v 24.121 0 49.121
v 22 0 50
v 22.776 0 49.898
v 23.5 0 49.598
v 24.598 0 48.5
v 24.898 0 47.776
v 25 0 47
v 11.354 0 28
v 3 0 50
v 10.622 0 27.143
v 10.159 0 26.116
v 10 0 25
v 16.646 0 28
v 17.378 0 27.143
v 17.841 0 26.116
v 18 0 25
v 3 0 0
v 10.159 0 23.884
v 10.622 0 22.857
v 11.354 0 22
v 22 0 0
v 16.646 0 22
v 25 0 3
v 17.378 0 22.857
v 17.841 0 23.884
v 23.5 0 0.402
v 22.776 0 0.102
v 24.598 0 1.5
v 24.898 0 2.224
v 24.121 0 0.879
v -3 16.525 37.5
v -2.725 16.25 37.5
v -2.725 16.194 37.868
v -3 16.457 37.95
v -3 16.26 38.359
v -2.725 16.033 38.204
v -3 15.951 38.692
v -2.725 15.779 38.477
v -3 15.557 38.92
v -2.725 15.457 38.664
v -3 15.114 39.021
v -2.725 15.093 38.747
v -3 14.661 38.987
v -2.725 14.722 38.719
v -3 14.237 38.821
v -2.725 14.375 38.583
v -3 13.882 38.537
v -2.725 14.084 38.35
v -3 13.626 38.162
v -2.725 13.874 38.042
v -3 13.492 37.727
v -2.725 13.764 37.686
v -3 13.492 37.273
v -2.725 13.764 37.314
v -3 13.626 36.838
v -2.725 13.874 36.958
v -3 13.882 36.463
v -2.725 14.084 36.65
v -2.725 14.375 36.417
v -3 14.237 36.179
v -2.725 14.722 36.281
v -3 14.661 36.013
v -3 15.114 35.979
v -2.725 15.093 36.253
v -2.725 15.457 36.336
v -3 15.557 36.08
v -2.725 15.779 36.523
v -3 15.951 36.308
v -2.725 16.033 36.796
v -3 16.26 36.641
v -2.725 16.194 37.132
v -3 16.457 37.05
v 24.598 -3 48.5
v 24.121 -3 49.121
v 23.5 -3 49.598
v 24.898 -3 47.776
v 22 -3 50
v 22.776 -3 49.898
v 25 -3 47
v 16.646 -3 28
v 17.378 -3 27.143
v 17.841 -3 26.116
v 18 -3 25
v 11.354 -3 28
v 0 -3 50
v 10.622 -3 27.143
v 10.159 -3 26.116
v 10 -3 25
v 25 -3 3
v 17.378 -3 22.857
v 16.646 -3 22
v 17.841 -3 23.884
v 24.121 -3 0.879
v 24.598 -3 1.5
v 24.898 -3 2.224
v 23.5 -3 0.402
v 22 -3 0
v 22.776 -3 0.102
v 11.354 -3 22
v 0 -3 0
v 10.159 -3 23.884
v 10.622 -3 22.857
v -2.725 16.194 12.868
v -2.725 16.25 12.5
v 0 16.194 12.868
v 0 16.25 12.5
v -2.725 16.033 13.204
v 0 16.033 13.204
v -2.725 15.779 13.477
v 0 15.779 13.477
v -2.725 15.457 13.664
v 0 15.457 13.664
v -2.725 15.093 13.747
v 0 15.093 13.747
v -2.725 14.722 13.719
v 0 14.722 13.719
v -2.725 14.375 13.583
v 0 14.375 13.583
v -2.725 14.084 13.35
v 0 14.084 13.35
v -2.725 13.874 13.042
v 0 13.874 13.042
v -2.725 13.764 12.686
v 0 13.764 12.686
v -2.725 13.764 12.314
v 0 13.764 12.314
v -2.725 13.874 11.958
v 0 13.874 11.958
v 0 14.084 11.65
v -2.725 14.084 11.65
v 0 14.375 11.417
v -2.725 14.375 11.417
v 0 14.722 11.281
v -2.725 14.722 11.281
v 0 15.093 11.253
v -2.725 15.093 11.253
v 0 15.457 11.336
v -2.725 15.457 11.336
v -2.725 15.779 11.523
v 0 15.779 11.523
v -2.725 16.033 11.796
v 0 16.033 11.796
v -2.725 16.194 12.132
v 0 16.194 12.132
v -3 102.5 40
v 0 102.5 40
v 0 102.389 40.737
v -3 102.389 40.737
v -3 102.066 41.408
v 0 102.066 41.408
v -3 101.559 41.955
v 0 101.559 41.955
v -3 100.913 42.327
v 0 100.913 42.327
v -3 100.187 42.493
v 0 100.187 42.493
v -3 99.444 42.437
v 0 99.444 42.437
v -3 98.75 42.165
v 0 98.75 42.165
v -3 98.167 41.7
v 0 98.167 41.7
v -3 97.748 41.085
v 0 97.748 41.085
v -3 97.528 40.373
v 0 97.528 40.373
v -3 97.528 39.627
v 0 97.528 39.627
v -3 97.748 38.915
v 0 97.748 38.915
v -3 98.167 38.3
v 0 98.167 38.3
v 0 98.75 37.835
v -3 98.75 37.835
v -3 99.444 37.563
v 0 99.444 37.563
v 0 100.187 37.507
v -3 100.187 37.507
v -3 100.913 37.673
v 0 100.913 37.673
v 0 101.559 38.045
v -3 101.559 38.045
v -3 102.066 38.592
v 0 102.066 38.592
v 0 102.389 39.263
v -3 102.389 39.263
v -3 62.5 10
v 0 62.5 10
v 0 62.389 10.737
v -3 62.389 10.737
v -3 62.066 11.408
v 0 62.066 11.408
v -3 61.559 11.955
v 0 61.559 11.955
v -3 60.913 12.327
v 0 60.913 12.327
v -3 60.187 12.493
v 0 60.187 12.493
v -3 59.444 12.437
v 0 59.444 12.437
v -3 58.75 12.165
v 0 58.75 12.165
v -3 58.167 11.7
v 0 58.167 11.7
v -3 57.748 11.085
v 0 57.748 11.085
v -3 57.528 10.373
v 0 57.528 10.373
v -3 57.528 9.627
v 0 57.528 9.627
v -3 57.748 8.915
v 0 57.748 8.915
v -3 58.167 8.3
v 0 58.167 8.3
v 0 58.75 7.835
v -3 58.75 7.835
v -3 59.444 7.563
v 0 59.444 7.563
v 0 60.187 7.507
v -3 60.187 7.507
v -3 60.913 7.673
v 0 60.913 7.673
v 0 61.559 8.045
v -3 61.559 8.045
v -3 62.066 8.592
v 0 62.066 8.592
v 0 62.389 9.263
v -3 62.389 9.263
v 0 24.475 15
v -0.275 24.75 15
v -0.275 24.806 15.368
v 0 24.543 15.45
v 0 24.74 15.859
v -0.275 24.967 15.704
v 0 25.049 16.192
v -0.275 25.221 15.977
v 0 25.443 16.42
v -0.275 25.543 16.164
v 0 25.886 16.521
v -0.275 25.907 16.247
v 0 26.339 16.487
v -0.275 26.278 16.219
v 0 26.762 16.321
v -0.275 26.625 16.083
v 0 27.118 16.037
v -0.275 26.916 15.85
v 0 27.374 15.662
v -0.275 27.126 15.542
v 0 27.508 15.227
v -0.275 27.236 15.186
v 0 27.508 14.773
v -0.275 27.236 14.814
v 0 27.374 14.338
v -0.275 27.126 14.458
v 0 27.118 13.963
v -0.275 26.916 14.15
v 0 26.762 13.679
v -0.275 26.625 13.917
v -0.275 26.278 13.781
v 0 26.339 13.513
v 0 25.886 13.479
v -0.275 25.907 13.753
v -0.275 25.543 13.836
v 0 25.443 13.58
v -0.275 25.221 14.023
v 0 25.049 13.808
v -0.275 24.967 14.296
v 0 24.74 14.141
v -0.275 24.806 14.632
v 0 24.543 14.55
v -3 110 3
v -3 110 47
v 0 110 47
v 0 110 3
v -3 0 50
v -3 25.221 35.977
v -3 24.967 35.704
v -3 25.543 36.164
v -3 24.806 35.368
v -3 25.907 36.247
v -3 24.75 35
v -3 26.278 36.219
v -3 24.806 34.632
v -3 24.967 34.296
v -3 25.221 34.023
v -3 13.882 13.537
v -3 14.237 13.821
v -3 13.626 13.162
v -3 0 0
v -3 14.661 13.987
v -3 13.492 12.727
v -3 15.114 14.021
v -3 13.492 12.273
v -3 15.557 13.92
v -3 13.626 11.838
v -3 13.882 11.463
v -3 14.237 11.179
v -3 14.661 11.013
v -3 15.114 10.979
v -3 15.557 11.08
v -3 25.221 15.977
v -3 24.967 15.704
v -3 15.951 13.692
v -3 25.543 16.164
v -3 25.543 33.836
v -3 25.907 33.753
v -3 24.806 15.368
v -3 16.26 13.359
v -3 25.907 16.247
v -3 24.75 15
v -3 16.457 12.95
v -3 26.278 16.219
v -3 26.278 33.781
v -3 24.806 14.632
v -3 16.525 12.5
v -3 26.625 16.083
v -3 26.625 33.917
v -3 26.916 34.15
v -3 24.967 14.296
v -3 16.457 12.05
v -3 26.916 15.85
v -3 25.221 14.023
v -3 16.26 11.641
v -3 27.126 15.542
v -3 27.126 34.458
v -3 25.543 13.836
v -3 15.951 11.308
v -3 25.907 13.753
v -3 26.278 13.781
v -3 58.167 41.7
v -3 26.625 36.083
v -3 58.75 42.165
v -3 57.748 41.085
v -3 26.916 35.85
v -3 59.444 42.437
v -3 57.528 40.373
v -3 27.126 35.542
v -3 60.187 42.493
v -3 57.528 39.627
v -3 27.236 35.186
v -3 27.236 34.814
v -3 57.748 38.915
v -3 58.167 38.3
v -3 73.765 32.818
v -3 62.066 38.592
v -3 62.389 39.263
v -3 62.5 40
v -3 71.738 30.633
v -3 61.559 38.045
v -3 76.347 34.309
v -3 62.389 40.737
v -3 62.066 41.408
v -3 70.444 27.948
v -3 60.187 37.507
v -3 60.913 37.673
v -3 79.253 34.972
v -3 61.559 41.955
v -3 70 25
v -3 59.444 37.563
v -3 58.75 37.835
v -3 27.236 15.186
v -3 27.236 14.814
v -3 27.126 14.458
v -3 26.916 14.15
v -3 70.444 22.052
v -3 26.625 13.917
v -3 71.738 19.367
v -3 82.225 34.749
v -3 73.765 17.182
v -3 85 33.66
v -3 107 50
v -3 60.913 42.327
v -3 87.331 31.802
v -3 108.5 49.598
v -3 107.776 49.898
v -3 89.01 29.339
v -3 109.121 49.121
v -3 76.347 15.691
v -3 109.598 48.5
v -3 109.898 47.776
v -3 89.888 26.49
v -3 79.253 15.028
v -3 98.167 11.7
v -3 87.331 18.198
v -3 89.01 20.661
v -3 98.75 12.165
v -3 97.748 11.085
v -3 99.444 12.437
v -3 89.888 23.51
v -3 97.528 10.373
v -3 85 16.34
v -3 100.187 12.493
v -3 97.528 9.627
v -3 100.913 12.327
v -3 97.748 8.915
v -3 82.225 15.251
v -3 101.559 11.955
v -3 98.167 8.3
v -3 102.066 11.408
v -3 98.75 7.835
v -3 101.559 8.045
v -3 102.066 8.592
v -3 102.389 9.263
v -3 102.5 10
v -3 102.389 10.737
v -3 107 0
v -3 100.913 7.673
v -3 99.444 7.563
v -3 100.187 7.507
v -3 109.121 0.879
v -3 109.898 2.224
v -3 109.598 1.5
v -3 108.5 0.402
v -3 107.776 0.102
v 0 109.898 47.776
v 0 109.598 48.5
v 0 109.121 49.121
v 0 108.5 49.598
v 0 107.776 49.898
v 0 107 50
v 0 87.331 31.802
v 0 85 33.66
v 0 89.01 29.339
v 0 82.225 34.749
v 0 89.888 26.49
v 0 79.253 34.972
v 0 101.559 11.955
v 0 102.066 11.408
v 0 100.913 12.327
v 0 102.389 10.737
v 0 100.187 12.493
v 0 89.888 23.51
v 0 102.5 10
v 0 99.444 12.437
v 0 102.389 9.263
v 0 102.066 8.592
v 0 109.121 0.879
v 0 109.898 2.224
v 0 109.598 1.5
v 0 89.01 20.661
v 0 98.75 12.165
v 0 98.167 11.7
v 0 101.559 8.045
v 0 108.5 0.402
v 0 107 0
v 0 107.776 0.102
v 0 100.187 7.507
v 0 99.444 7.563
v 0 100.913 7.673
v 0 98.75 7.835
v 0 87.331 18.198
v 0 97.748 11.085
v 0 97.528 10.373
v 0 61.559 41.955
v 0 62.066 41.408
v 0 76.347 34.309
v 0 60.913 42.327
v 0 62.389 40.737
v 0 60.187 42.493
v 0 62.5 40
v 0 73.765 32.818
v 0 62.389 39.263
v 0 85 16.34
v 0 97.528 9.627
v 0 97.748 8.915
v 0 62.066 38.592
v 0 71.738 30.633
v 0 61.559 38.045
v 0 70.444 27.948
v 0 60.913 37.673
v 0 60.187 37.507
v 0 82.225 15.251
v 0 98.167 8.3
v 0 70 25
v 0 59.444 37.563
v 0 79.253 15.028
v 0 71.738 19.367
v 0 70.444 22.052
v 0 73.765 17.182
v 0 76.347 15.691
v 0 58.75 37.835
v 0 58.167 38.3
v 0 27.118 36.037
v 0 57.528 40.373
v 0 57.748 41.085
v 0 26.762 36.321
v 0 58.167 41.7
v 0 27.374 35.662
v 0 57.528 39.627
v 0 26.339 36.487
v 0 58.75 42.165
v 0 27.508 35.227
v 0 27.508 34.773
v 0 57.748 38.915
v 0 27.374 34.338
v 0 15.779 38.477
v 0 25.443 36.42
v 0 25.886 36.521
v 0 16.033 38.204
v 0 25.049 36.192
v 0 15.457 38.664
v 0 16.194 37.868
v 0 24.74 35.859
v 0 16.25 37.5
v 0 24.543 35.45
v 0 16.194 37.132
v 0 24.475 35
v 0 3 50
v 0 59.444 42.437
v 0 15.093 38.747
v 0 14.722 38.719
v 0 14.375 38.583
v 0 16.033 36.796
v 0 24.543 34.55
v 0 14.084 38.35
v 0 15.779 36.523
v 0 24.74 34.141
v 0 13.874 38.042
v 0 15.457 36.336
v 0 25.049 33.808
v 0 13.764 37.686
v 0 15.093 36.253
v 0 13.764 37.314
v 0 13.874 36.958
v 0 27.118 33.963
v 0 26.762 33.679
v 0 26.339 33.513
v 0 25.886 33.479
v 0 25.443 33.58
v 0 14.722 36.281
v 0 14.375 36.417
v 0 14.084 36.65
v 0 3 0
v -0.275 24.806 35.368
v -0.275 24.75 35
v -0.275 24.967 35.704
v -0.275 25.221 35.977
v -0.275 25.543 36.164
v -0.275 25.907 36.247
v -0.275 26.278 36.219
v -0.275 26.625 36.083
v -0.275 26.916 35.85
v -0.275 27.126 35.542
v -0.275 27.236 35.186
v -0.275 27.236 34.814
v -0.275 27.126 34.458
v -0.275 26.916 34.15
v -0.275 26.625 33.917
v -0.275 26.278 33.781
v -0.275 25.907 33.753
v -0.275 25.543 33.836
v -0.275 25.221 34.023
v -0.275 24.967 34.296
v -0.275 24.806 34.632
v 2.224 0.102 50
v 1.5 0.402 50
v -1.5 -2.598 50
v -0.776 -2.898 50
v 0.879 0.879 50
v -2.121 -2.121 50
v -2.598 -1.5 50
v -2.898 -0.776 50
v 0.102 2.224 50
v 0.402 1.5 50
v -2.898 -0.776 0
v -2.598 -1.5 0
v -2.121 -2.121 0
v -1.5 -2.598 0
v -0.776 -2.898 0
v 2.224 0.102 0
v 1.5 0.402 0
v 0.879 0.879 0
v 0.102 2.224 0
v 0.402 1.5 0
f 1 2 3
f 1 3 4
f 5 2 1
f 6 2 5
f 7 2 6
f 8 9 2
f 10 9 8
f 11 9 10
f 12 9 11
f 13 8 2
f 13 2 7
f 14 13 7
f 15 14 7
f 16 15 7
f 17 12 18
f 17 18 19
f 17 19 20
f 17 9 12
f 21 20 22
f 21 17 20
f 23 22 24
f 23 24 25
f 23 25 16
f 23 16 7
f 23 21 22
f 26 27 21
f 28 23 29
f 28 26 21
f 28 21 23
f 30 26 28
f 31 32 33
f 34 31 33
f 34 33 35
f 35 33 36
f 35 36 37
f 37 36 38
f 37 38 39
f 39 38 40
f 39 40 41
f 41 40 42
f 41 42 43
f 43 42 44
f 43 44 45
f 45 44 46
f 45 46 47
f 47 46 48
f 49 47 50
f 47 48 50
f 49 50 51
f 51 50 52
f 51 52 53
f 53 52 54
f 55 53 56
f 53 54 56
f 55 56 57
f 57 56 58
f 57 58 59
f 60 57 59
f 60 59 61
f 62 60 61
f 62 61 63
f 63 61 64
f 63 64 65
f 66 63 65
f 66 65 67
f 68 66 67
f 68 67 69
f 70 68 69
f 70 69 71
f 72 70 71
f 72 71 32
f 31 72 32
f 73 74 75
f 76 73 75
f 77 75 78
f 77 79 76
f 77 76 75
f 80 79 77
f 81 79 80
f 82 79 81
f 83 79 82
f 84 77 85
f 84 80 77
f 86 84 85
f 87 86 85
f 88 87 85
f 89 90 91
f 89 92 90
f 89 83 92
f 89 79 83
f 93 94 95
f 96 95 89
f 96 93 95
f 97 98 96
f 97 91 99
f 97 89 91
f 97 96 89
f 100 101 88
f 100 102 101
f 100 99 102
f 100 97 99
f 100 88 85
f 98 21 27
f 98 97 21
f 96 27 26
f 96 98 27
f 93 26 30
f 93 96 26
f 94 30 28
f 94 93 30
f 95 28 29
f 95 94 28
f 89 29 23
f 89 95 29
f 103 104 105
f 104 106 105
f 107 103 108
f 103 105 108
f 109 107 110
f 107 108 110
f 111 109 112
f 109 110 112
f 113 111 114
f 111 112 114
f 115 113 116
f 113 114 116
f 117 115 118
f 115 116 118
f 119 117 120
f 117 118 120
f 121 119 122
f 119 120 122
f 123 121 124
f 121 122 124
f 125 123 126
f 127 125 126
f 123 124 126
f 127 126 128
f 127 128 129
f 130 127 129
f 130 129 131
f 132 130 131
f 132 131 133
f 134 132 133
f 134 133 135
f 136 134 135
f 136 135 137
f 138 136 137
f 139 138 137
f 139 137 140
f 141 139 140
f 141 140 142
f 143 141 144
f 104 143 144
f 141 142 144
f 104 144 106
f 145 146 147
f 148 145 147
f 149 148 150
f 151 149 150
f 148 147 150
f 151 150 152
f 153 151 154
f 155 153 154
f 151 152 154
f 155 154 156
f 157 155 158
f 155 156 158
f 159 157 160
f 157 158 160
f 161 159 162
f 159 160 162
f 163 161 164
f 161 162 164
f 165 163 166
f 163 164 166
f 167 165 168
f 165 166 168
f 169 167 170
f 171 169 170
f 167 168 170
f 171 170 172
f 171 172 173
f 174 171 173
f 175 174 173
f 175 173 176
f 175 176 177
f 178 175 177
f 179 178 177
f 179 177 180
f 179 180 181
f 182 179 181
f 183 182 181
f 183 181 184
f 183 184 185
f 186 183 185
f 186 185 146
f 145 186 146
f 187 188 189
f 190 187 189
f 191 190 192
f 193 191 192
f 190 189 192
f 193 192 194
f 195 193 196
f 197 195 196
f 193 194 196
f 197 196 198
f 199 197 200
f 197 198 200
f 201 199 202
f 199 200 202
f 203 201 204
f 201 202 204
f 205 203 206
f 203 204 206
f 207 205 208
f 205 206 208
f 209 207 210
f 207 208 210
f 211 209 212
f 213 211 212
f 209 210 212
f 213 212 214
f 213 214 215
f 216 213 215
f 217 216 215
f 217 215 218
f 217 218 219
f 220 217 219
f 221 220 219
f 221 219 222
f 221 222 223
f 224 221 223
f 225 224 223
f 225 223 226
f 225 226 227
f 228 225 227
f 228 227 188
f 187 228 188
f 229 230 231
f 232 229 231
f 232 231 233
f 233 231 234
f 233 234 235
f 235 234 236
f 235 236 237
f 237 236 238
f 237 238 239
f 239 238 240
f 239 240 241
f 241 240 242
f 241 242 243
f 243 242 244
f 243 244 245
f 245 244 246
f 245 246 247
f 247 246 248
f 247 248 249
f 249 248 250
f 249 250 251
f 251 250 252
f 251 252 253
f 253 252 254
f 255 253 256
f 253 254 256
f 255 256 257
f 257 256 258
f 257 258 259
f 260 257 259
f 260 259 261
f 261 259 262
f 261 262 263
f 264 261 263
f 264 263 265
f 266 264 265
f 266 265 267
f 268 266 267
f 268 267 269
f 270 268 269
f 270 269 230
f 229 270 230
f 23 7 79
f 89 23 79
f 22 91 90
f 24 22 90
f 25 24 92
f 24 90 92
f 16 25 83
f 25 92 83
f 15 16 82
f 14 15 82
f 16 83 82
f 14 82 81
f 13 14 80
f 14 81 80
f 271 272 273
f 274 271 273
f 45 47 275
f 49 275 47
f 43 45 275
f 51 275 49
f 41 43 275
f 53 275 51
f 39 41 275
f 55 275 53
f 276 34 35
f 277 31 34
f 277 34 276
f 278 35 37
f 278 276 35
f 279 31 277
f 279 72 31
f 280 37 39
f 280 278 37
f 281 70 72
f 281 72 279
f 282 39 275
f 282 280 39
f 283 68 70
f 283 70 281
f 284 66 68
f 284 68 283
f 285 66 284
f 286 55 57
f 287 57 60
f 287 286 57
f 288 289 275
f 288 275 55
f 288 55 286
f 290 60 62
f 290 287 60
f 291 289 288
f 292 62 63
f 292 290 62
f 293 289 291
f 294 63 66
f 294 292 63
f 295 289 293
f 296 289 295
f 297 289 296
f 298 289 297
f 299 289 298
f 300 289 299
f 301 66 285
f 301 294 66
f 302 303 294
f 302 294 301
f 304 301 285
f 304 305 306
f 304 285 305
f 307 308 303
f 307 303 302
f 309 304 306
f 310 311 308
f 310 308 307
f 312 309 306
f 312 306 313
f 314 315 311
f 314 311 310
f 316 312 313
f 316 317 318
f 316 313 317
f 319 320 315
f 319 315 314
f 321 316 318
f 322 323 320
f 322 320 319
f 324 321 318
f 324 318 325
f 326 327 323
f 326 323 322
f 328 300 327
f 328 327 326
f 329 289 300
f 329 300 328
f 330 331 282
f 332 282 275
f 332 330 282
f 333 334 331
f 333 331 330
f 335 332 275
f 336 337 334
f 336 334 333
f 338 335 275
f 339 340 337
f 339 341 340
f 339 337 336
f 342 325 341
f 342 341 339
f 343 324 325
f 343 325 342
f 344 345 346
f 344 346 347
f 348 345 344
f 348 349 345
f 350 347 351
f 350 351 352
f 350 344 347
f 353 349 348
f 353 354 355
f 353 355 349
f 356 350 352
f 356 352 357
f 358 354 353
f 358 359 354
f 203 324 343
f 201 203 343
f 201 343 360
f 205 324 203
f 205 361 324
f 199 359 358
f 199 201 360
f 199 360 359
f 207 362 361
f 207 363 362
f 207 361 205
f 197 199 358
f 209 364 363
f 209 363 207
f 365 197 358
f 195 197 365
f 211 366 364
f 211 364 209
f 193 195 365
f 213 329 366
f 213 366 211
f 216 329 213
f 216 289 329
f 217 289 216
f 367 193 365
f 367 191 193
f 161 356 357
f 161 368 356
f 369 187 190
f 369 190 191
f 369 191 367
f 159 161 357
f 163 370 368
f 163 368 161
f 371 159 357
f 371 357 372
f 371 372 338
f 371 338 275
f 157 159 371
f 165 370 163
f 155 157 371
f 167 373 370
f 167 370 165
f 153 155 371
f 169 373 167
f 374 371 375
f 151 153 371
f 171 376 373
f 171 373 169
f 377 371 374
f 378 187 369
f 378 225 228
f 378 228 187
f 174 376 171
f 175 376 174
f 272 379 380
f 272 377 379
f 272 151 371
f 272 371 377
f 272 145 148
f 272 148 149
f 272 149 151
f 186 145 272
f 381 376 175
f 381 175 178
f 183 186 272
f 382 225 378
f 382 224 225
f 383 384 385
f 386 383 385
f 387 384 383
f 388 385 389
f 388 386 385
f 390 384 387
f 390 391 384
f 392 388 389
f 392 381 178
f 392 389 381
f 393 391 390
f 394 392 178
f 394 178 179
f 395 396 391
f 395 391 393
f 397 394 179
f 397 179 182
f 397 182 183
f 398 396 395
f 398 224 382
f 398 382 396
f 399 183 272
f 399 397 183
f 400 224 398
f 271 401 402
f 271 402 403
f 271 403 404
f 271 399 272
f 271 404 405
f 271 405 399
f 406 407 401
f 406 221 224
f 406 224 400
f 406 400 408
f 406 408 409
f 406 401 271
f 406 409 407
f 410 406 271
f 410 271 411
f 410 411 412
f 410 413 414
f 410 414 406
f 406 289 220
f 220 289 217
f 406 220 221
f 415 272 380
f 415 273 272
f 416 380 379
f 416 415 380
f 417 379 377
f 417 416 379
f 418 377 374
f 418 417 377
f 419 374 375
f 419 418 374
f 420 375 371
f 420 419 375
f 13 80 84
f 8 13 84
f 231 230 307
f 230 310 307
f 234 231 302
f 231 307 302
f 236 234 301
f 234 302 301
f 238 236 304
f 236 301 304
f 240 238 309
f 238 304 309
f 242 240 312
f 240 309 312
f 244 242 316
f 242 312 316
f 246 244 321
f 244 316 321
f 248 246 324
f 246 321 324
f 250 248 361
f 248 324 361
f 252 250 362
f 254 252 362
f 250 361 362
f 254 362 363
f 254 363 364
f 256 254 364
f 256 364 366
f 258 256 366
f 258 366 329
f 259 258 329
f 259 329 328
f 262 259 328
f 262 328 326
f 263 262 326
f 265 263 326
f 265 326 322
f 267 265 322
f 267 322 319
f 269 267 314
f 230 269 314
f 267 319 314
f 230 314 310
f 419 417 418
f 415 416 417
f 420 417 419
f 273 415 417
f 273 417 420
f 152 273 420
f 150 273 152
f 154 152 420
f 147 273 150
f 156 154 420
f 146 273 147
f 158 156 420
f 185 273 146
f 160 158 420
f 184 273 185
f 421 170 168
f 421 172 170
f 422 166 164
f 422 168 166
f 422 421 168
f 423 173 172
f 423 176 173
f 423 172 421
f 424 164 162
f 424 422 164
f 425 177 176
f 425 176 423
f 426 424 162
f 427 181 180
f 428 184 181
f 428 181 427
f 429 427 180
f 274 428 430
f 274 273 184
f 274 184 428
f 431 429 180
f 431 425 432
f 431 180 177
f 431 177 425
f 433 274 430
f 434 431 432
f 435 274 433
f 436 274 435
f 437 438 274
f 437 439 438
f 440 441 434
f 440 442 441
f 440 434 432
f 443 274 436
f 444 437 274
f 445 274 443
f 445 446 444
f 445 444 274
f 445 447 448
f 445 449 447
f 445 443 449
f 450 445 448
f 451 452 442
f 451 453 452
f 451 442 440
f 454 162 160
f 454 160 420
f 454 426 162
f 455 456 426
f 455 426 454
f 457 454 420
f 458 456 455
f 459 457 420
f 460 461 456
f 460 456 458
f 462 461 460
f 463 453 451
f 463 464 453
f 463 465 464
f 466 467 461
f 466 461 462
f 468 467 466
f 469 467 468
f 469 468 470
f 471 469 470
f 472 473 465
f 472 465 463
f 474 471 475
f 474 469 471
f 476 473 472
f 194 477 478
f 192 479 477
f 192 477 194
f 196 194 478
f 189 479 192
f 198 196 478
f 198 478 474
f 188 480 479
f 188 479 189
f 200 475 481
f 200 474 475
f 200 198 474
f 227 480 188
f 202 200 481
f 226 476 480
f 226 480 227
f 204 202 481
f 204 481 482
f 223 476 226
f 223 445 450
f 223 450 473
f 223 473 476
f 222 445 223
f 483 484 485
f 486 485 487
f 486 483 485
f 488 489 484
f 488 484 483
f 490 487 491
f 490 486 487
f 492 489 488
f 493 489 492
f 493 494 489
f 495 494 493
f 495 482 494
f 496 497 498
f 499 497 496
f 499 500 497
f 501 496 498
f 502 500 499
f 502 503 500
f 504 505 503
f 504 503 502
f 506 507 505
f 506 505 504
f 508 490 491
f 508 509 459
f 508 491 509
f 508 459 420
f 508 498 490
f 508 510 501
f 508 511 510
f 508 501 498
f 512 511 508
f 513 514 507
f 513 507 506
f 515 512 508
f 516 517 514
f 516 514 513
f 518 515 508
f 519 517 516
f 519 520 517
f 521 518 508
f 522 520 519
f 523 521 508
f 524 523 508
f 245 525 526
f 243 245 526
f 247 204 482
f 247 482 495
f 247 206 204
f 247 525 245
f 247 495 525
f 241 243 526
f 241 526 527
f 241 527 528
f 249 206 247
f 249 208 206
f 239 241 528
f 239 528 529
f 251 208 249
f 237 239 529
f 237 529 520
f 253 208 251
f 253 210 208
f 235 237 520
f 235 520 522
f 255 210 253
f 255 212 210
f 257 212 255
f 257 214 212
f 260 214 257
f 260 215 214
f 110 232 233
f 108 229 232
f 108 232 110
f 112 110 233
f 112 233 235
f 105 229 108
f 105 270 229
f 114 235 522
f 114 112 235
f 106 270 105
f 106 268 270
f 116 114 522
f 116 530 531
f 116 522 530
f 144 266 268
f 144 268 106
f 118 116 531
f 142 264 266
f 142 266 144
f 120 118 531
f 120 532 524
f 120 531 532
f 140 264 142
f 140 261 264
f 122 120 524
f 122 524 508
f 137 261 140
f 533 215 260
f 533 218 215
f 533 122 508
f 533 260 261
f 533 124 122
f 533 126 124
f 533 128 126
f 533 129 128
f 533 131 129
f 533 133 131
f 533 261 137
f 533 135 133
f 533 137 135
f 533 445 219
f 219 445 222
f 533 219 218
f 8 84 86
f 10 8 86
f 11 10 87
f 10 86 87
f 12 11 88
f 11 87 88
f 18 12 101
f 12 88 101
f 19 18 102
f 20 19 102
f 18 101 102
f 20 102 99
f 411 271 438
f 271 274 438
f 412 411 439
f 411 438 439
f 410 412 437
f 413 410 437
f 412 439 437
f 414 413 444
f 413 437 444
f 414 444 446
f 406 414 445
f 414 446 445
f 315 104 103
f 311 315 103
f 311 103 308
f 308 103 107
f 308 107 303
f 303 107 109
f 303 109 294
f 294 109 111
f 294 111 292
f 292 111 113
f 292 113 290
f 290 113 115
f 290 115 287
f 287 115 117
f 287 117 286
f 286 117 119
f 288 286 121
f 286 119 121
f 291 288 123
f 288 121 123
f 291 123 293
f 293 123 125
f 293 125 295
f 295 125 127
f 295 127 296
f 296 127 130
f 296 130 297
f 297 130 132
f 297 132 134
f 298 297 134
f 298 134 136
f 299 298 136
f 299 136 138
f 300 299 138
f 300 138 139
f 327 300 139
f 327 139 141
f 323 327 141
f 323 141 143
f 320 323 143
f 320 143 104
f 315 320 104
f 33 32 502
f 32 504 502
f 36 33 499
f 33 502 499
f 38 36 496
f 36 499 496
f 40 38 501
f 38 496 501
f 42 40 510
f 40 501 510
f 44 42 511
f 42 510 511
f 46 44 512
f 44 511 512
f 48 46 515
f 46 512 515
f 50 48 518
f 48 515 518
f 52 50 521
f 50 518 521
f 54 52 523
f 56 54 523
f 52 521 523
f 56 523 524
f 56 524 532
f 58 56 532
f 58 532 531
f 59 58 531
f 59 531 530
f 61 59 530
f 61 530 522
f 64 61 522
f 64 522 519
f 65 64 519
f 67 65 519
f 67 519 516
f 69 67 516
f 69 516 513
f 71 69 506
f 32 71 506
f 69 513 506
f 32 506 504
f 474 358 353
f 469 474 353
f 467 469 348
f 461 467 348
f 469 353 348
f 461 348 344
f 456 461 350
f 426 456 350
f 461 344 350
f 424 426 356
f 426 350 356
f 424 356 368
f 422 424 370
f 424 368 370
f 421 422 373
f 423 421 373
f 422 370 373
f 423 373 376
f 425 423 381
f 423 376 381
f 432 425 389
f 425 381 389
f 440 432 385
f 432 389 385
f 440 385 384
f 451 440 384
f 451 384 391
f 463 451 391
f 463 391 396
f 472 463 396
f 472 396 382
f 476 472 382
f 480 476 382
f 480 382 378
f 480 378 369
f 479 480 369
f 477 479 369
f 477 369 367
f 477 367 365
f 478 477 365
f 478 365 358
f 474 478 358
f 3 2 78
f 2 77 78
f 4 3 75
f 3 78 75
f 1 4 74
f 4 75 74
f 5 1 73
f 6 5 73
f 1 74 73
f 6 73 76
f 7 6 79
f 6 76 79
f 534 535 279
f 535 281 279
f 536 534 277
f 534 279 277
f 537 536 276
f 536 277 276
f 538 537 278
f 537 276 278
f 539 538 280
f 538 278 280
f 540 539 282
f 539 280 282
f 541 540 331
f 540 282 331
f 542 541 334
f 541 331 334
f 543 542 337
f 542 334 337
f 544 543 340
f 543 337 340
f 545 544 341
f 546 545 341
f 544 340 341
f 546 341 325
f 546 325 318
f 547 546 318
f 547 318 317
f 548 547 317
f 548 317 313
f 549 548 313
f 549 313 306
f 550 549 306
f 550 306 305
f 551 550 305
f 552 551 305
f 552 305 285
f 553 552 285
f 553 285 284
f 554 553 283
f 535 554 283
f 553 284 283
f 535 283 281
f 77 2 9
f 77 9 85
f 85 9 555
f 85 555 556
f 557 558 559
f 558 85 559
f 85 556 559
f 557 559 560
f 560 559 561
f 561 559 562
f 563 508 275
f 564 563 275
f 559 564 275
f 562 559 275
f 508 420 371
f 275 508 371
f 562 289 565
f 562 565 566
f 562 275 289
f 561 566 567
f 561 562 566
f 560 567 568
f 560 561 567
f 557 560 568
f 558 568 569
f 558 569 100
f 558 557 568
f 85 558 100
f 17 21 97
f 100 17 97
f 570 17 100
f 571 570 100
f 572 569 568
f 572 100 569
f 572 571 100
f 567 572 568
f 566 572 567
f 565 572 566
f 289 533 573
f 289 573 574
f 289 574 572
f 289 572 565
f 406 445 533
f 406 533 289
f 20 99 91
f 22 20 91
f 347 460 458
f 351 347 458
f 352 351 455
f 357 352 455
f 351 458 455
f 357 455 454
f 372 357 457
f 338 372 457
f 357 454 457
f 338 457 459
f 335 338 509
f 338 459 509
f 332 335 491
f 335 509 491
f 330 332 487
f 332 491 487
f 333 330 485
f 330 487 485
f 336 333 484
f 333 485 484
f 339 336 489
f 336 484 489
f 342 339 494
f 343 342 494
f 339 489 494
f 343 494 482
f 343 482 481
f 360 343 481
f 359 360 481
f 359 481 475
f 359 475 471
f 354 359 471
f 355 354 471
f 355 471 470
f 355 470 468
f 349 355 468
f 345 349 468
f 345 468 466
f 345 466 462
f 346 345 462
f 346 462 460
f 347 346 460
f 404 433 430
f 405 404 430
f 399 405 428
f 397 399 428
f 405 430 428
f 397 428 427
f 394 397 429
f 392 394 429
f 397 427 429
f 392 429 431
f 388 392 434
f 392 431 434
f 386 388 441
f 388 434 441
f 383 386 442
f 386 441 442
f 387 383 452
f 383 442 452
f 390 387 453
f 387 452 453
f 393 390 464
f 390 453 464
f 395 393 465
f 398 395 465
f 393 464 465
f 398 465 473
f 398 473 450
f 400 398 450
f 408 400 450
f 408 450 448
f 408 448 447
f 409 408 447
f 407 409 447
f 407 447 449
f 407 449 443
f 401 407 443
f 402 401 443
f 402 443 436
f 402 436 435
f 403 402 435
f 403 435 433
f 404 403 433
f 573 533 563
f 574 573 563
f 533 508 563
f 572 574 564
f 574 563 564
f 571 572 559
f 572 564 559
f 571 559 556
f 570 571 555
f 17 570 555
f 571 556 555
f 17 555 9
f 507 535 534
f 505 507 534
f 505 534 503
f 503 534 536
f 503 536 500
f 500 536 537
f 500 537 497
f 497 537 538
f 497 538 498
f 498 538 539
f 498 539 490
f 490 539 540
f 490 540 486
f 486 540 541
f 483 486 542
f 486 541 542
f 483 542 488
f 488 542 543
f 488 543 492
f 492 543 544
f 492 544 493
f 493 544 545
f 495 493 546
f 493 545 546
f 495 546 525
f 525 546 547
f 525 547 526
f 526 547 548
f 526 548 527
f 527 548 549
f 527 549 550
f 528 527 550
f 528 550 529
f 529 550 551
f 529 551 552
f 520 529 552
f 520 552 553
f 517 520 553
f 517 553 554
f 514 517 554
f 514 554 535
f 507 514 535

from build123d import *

# Parameters (mm, degrees)
EXTRUDE_THIN1_DEPTH         = 50
HOLE1_D                     = 5
SKETCH3_R                   = 10
CUT_EXTRUDE1_DEPTH          = 125.03225387
M3_TAPPED_HOLE1_D           = 2.5
M3_TAPPED_HOLE1_DEPTH       = 7.5
M3_TAPPED_HOLE1_CSINK_D     = 3.05
M3_TAPPED_HOLE1_CSINK_ANGLE = 90
M3_TAPPED_HOLE1_TIP         = 0.751075774
CUT_EXTRUDE2_DEPTH          = 10
FILLET1_R                   = 3
M3_TAPPED_HOLE2_D           = 2.5
M3_TAPPED_HOLE2_DEPTH       = 7.5
M3_TAPPED_HOLE2_CSINK_D     = 3.05
M3_TAPPED_HOLE2_CSINK_ANGLE = 90
M3_TAPPED_HOLE2_TIP         = 0.751075774
FILLET2_R                   = 3
FILLET3_R                   = 3


with BuildPart() as part:
    # Sketch1 → Extrude-Thin1 (new body)
    with BuildSketch(Plane.XY):
        Polygon((0, 110), (0, 0), (25, 0), (25, -3), (-3, -3), (-3, 110), align=None)
    extrude(amount=EXTRUDE_THIN1_DEPTH)

    # Hole1 (through all)
    with Locations(Plane(origin=(-3, 100, 10), x_dir=(0, -1, 0), z_dir=(-1, 0, 0))):
        with Locations((0, 0), (0, 30), (40, 30), (40, 0)):
            Hole(HOLE1_D / 2)

    # Sketch3 → Cut-Extrude1 (cut, through all)
    with BuildSketch(Plane.ZY.offset(3)):
        with Locations(Location((25, 80, 0), (0, 0, 270))):
            Circle(SKETCH3_R)
    extrude(amount=-CUT_EXTRUDE1_DEPTH, mode=Mode.SUBTRACT)

    # M3 Tapped Hole1
    with Locations(Plane(origin=(-3, 15, 12.5), x_dir=(0, -1, 0), z_dir=(-1, 0, 0))):
        with Locations((0, 0), (0, 25)):
            CounterSinkHole(M3_TAPPED_HOLE1_D / 2, M3_TAPPED_HOLE1_CSINK_D / 2, depth=M3_TAPPED_HOLE1_DEPTH, counter_sink_angle=M3_TAPPED_HOLE1_CSINK_ANGLE)
            with Locations((0, 0, -(M3_TAPPED_HOLE1_DEPTH + M3_TAPPED_HOLE1_TIP / 2))):  # 118° drill point
                Cone(0, M3_TAPPED_HOLE1_D / 2, M3_TAPPED_HOLE1_TIP, mode=Mode.SUBTRACT)

    # Sketch5 → Cut-Extrude2 (cut)
    with BuildSketch(Plane(origin=(0, -3, 0), x_dir=(-1, 0, 0), z_dir=(0, -1, 0))):
        with BuildLine():
            Line((-11.354248689, -22), (-16.645751311, -22))
            ThreePointArc((-16.645751311, -22), (-18, -25), (-16.645751311, -28))
            Line((-16.645751311, -28), (-11.354248689, -28))
            ThreePointArc((-11.354248689, -28), (-10, -25), (-11.354248689, -22))
        make_face()
    extrude(amount=-CUT_EXTRUDE2_DEPTH, mode=Mode.SUBTRACT)

    # Fillet1
    fillet1_edges = [part.edges().sort_by_distance(p)[0] for p in [
        (-1.5, 110, 50),
        (-1.5, 110, 0),
        (25, -1.5, 0),
        (25, -1.5, 50),
    ]]
    fillet(fillet1_edges, radius=FILLET1_R)

    # M3 Tapped Hole2
    with Locations(Plane(origin=(0, 26, 35), x_dir=(0, 1, 0), z_dir=(1, 0, 0))):
        with Locations((0, 0), (0, -20)):
            CounterSinkHole(M3_TAPPED_HOLE2_D / 2, M3_TAPPED_HOLE2_CSINK_D / 2, depth=M3_TAPPED_HOLE2_DEPTH, counter_sink_angle=M3_TAPPED_HOLE2_CSINK_ANGLE)
            with Locations((0, 0, -(M3_TAPPED_HOLE2_DEPTH + M3_TAPPED_HOLE2_TIP / 2))):  # 118° drill point
                Cone(0, M3_TAPPED_HOLE2_D / 2, M3_TAPPED_HOLE2_TIP, mode=Mode.SUBTRACT)

    # Fillet2
    fillet2_edges = [part.edges().sort_by_distance(p)[0] for p in [
        (-3, -3, 25),
    ]]
    fillet(fillet2_edges, radius=FILLET2_R)

    # Fillet3
    fillet3_edges = [part.edges().sort_by_distance(p)[0] for p in [
        (0, 0, 25),
    ]]
    fillet(fillet3_edges, radius=FILLET3_R)


solid = part.part
